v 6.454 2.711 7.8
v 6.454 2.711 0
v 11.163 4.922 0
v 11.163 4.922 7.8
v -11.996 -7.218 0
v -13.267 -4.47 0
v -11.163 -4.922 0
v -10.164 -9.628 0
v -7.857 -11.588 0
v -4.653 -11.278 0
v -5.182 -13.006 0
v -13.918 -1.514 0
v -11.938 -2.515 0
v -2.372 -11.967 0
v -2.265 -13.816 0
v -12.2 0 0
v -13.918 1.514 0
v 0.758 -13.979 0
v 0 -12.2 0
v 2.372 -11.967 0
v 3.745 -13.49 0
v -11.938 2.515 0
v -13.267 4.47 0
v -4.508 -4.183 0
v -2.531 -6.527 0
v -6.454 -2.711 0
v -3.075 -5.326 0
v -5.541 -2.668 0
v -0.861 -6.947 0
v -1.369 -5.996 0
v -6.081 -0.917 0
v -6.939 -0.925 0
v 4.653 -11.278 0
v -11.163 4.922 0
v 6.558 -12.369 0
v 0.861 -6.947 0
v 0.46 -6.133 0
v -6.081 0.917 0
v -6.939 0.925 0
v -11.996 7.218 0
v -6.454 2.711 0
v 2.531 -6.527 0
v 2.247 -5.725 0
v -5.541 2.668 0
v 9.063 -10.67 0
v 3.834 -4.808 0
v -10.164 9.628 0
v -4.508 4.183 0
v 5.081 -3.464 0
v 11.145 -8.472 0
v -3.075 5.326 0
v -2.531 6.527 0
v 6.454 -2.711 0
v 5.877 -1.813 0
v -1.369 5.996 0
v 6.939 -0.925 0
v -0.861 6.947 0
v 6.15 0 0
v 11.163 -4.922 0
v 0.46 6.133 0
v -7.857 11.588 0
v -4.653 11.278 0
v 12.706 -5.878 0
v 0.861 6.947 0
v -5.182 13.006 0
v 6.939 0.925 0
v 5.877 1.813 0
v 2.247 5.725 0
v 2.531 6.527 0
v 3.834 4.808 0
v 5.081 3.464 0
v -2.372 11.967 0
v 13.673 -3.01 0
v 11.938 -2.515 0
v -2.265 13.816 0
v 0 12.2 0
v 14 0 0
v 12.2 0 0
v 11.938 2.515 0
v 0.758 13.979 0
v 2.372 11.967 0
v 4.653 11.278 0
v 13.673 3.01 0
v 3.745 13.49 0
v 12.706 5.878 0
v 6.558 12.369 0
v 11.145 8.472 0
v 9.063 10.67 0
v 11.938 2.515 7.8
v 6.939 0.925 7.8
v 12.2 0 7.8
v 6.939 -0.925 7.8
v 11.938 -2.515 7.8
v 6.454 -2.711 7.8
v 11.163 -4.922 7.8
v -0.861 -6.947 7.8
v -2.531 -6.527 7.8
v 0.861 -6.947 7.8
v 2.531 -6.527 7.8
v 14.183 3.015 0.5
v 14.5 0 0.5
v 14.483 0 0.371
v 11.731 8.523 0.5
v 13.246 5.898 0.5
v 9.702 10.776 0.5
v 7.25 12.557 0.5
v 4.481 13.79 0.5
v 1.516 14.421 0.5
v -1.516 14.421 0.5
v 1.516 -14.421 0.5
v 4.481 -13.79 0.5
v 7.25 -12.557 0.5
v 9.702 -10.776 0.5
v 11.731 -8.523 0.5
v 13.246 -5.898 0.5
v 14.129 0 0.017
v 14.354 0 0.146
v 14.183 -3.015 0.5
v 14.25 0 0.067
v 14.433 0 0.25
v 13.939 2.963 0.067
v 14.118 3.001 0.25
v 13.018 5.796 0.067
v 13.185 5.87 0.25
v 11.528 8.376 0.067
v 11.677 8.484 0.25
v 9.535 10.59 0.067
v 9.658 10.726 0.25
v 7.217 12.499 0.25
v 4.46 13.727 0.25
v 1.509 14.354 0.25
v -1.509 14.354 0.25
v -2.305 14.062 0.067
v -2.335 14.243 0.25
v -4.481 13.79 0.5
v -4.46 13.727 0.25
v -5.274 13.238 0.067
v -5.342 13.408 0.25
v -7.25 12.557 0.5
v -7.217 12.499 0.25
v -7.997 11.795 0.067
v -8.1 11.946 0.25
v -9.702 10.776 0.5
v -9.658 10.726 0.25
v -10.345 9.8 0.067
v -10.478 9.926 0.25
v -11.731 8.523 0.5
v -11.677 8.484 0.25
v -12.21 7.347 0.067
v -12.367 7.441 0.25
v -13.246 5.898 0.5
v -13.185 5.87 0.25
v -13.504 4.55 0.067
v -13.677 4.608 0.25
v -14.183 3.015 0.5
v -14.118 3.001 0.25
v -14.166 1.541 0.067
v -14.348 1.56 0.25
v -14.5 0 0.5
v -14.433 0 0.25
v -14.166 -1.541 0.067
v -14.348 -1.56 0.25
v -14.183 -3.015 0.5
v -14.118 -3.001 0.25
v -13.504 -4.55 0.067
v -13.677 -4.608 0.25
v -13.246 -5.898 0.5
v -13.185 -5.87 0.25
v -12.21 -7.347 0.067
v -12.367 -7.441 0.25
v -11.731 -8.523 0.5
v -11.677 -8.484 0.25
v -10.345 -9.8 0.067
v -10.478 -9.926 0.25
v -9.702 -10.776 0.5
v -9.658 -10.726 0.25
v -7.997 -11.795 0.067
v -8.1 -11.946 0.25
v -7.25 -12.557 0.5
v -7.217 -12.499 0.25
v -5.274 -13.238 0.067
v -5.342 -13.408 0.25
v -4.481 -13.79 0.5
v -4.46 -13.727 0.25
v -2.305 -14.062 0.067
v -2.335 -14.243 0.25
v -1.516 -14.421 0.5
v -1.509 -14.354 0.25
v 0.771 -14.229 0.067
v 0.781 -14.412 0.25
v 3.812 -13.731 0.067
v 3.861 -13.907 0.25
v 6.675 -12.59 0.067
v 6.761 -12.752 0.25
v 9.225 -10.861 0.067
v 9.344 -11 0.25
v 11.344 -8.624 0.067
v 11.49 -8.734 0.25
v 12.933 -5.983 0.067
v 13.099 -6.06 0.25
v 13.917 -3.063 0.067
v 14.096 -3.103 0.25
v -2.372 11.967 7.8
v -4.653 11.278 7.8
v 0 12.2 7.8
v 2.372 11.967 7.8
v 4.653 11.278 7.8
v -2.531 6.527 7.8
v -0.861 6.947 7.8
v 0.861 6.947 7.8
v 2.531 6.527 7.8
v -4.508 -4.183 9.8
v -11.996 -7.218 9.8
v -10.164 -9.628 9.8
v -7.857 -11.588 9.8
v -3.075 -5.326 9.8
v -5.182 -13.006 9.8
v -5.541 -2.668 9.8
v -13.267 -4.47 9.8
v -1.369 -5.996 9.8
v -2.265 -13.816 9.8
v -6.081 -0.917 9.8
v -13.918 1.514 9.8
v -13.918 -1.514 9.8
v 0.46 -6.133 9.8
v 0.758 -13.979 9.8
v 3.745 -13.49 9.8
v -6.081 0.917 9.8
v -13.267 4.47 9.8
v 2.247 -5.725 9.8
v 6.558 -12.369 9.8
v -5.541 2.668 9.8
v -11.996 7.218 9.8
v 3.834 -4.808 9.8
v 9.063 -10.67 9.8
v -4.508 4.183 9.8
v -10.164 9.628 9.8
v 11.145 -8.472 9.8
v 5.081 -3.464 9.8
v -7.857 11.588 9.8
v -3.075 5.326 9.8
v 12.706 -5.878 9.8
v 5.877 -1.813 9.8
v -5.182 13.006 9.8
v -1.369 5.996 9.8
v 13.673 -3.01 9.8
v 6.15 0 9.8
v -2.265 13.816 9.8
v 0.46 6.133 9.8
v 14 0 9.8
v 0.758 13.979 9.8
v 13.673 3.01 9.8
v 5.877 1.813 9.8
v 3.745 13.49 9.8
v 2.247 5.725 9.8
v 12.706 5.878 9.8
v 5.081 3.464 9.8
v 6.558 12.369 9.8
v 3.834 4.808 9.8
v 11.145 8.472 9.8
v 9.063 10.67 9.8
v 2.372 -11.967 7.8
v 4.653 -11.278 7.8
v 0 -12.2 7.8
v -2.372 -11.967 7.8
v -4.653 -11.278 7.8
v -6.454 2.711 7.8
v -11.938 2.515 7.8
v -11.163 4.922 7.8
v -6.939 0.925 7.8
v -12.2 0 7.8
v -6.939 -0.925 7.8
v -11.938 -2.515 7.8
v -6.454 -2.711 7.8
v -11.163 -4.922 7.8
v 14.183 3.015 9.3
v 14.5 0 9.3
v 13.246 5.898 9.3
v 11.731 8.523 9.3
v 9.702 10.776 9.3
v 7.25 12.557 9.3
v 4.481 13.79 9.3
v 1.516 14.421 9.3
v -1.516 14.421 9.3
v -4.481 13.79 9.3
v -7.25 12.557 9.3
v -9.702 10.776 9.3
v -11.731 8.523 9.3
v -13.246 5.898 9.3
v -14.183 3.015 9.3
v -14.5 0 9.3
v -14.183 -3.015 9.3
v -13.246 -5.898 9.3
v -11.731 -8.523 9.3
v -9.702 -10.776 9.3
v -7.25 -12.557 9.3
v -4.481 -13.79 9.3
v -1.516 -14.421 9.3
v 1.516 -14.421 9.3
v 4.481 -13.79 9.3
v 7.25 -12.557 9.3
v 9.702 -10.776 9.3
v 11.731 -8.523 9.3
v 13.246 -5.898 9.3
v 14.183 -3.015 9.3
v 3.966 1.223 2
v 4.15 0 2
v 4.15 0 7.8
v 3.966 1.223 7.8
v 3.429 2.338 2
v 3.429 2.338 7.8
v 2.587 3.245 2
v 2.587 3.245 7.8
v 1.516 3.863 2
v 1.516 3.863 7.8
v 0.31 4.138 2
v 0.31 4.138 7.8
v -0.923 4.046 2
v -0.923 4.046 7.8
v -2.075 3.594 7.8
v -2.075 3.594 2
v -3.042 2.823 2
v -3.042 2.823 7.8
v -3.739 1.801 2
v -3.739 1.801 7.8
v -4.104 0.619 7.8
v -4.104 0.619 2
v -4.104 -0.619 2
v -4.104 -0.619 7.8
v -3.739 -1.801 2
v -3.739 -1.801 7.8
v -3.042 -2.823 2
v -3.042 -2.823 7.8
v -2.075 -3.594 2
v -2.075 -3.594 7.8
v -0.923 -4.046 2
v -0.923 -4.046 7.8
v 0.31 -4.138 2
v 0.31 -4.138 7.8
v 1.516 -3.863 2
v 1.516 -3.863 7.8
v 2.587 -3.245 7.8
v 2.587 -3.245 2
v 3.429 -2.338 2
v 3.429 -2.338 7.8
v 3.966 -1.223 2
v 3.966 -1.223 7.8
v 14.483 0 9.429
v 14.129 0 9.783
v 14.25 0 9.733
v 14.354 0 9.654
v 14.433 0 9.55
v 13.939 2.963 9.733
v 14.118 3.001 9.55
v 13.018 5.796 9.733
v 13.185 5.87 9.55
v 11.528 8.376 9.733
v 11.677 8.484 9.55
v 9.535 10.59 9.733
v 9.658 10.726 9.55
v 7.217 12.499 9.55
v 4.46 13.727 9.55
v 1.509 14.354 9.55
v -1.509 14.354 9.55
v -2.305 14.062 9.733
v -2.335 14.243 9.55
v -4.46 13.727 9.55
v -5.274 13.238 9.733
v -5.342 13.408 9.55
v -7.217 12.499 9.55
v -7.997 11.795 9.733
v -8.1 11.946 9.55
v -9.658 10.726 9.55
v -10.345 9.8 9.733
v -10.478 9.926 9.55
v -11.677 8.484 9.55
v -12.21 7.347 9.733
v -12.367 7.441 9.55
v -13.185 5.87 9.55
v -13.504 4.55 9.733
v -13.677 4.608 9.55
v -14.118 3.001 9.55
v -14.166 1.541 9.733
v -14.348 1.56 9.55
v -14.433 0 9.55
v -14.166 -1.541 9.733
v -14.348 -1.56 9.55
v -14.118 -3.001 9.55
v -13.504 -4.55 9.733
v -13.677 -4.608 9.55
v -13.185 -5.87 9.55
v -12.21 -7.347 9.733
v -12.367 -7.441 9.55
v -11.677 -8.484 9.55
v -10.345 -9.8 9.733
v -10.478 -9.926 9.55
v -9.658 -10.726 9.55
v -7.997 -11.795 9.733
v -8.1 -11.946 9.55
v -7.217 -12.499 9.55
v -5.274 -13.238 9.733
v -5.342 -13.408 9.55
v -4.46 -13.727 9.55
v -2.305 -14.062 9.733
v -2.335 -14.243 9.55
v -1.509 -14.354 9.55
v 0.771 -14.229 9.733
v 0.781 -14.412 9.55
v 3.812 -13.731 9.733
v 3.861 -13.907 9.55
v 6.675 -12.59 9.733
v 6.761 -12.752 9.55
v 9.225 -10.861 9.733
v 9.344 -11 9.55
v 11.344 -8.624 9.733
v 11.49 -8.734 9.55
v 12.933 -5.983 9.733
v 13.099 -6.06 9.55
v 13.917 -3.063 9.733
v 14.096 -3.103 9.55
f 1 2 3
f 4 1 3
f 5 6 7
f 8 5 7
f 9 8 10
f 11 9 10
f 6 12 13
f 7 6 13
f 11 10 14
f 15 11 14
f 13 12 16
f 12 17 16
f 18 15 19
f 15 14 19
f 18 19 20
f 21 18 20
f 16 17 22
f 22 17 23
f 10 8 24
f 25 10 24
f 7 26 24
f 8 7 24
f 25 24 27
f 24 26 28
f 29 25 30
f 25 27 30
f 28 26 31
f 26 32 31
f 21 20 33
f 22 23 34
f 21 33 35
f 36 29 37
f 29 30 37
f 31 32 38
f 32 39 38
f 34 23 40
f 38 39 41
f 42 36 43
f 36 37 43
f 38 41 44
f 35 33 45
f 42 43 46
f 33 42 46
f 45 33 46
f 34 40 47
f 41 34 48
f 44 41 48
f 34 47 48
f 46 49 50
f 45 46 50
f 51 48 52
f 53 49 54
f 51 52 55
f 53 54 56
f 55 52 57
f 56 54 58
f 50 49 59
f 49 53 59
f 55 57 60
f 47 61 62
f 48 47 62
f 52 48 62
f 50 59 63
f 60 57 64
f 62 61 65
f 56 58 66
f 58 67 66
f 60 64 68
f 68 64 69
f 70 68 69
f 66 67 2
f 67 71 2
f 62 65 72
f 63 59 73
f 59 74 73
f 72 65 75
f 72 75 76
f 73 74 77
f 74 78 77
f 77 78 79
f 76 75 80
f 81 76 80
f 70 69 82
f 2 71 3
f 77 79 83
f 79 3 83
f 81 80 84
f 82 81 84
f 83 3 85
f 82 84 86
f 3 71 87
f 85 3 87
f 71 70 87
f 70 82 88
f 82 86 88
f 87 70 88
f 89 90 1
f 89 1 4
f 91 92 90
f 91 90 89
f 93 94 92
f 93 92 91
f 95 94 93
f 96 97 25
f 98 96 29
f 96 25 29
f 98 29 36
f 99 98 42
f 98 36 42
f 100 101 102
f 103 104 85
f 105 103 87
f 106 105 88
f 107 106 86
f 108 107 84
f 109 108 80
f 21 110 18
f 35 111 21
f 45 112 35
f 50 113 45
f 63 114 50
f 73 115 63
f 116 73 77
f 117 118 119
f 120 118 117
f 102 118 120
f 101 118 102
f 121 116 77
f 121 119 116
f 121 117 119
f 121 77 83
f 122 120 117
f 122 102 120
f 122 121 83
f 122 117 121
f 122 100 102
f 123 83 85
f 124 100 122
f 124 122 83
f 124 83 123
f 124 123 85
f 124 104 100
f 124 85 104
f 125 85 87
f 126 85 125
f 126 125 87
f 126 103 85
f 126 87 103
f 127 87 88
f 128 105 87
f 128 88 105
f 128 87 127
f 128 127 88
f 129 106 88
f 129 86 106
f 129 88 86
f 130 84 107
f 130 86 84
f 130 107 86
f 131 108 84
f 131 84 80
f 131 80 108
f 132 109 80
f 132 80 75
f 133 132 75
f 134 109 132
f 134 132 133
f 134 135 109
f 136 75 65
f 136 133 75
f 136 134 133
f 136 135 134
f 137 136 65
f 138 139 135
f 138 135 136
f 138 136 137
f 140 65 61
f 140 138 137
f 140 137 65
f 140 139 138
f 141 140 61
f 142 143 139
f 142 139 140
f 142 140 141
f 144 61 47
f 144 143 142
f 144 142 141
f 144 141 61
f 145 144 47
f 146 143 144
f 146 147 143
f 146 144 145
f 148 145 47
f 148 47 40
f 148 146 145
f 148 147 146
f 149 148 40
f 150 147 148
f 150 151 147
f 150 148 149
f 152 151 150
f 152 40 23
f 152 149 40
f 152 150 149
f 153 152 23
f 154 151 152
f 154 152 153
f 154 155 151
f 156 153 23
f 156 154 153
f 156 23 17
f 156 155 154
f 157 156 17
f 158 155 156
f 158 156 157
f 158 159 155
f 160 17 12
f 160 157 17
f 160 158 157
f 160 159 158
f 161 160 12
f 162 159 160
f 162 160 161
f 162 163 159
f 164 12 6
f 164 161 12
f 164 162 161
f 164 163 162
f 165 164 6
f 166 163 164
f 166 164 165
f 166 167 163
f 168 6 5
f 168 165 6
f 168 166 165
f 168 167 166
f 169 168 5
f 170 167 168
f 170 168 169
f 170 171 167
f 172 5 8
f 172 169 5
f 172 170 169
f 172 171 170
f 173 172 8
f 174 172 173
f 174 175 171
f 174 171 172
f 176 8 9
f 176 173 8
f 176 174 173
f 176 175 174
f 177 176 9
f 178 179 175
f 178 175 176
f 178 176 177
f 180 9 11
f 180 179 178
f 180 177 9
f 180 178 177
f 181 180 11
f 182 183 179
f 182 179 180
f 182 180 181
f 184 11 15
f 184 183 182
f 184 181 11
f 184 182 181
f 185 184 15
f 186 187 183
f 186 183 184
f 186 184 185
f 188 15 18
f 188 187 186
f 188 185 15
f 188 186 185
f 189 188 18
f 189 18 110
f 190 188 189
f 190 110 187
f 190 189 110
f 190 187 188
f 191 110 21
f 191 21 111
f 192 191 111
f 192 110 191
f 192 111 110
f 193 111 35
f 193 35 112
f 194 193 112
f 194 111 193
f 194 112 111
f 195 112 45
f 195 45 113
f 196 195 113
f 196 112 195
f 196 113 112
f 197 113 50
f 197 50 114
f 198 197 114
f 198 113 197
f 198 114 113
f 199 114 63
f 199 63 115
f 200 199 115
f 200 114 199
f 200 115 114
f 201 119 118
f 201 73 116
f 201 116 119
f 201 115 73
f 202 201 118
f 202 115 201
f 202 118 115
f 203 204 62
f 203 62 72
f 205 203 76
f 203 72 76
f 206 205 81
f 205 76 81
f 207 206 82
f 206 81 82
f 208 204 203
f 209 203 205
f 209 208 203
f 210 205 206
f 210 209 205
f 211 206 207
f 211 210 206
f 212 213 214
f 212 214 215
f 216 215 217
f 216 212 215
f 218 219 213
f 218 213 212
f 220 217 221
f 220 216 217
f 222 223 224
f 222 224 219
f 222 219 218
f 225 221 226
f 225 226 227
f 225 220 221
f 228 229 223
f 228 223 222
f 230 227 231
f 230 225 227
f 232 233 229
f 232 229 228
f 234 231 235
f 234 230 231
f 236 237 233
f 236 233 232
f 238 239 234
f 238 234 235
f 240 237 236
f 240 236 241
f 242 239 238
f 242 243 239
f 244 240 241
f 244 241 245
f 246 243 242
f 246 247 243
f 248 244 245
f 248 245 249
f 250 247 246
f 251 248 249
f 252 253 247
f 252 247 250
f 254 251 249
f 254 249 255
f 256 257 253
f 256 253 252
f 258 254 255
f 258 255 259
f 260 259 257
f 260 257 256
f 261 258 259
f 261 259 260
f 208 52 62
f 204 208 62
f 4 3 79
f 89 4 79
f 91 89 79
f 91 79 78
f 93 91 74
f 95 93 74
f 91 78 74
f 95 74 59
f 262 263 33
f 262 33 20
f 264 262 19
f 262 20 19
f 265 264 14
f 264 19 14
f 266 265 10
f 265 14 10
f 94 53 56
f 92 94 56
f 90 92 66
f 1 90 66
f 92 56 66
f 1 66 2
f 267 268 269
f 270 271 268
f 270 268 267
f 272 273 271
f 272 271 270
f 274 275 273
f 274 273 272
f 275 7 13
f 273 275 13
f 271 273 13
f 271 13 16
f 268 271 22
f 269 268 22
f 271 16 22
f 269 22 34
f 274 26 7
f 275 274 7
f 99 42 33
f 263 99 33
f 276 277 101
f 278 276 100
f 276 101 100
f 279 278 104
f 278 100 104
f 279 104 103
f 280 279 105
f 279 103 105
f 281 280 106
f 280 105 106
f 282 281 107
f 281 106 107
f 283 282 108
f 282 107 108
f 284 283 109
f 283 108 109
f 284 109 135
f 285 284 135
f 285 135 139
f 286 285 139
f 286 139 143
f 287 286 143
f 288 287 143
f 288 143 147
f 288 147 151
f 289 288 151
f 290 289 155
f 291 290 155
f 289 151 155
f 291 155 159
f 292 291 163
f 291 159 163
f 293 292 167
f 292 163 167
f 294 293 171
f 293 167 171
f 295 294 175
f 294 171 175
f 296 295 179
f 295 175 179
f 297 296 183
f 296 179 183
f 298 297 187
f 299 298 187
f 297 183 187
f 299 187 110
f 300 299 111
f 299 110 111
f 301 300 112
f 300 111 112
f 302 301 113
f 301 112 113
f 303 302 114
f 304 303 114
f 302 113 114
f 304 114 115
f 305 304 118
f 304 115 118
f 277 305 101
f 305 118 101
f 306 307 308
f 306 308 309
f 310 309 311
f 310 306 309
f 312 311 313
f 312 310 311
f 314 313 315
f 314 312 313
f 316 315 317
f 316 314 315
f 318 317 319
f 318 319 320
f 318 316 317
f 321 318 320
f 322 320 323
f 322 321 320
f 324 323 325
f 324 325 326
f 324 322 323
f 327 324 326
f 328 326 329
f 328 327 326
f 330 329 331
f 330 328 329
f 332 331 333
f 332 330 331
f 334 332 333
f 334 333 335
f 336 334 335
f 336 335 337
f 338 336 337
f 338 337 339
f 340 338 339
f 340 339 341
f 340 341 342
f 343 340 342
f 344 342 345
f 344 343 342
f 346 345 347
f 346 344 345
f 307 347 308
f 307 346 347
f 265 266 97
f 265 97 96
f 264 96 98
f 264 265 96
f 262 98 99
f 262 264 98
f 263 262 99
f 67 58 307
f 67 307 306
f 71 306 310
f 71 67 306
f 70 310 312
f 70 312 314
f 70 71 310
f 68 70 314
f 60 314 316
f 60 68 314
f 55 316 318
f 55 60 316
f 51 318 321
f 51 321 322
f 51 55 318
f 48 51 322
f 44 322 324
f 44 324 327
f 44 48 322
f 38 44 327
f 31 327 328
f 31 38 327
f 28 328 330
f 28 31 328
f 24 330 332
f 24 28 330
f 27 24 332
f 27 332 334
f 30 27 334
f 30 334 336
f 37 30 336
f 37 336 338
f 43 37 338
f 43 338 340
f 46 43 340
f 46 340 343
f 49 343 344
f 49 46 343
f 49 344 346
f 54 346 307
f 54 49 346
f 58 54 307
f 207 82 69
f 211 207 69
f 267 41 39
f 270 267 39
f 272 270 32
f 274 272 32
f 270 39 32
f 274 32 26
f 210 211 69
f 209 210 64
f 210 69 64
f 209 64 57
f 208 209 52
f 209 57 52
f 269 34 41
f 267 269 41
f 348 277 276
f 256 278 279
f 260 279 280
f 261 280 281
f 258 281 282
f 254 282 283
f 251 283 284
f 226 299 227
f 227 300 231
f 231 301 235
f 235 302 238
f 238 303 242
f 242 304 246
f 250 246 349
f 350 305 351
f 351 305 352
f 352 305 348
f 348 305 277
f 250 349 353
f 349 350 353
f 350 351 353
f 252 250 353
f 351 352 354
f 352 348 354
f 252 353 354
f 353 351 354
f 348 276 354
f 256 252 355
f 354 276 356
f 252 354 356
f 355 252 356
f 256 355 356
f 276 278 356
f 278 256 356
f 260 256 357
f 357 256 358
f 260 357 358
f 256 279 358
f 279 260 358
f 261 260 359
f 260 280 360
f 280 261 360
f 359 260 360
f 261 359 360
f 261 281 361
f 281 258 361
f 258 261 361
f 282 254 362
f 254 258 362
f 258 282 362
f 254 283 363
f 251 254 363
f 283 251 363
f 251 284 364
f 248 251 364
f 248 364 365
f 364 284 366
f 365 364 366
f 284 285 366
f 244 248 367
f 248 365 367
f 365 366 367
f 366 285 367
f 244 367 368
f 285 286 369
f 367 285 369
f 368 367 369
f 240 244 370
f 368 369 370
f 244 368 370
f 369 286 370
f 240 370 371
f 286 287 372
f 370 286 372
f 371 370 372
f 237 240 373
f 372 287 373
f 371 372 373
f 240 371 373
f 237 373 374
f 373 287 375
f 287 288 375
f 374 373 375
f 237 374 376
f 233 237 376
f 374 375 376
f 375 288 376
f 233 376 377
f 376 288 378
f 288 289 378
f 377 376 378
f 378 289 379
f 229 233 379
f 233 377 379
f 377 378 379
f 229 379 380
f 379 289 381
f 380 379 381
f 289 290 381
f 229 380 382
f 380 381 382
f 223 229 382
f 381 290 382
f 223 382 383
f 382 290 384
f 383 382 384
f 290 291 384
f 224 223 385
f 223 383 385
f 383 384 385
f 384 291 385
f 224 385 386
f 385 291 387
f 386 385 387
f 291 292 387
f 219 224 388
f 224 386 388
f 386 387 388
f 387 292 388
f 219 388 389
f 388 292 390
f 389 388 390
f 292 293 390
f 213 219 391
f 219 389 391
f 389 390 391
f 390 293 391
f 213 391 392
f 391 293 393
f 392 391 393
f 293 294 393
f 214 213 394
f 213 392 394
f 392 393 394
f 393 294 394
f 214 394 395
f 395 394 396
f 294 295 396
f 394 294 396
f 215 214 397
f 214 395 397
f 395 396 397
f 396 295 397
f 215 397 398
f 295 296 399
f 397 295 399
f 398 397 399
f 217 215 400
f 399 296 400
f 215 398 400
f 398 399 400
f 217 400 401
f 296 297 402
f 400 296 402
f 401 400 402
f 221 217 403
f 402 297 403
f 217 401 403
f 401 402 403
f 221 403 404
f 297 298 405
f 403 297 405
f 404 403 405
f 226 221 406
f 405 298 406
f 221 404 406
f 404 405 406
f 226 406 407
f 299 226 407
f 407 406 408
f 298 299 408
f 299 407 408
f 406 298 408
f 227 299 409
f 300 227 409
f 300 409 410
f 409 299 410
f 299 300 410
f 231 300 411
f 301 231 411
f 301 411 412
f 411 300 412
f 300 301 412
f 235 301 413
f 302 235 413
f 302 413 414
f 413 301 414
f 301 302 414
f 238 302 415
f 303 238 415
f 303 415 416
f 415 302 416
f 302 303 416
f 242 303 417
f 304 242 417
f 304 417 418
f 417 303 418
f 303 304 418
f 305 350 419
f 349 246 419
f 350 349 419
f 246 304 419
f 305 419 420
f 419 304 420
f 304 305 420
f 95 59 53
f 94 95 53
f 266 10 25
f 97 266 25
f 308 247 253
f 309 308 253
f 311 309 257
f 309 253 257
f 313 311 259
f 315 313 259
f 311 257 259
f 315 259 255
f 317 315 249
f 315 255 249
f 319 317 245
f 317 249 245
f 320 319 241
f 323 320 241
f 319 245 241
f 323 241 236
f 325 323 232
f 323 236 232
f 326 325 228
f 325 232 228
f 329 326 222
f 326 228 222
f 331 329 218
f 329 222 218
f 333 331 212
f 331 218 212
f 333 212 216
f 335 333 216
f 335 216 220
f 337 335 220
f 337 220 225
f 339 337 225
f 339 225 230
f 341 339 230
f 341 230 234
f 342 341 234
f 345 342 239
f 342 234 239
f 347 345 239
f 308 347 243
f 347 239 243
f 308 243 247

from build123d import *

# Parameters (mm, degrees)
F0_R     = 14.5
F0_R_2   = 4.15
F1_DEPTH = 9.8
F2_SIZE  = 2
F4_DEPTH = 7.8
F5_R     = 0.5


with BuildPart() as f1:
    # F0 (on Top) → F1 (new body)
    with BuildSketch(Plane.XY):
        Circle(F0_R)
        Circle(F0_R_2, mode=Mode.SUBTRACT)
    extrude(amount=F1_DEPTH)

    # F2
    f2_edges = [f1.edges().sort_by_distance(p)[0] for p in [
        (-4.15, 0, 9.8),
        (-4.15, 0, 0),
    ]]
    chamfer(f2_edges, length=F2_SIZE)

    # F3 (on face) → F4 (cut)
    with BuildSketch(Plane(origin=(0, 0, 0), x_dir=(1, 0, 0), z_dir=(0, 0, -1))):
        with BuildLine():
            Line((2.53053, 6.526593), (4.653059, 11.277812))
            ThreePointArc((4.653059, 11.277812), (0, 12.2), (-4.653059, 11.277812))
            Line((-4.653059, 11.277812), (-2.53053, 6.526593))
            ThreePointArc((-2.53053, 6.526593), (0, 7), (2.53053, 6.526593))
        make_face()
        with BuildLine():
            Line((-6.453522, 2.711468), (-11.163082, 4.92195))
            ThreePointArc((-11.163082, 4.92195), (-12.2, 0), (-11.163082, -4.92195))
            Line((-11.163082, -4.92195), (-6.453522, -2.711468))
            ThreePointArc((-6.453522, -2.711468), (-7, 0), (-6.453522, 2.711468))
        make_face()
        with BuildLine():
            Line((4.653059, -11.277812), (2.53053, -6.526593))
            ThreePointArc((2.53053, -6.526593), (0, -7), (-2.53053, -6.526593))
            Line((-2.53053, -6.526593), (-4.653059, -11.277812))
            ThreePointArc((-4.653059, -11.277812), (0, -12.2), (4.653059, -11.277812))
        make_face()
        with BuildLine():
            Line((11.163082, 4.92195), (6.453522, 2.711468))
            ThreePointArc((6.453522, 2.711468), (7, 0), (6.453522, -2.711468))
            Line((6.453522, -2.711468), (11.163082, -4.92195))
            ThreePointArc((11.163082, -4.92195), (12.2, 0), (11.163082, 4.92195))
        make_face()
    extrude(amount=-F4_DEPTH, mode=Mode.SUBTRACT)

    # F5
    f5_edges = [f1.edges().sort_by_distance(p)[0] for p in [
        (-14.5, 0, 9.8),
        (-14.5, 0, 0),
    ]]
    fillet(f5_edges, radius=F5_R)


solid = f1.part
